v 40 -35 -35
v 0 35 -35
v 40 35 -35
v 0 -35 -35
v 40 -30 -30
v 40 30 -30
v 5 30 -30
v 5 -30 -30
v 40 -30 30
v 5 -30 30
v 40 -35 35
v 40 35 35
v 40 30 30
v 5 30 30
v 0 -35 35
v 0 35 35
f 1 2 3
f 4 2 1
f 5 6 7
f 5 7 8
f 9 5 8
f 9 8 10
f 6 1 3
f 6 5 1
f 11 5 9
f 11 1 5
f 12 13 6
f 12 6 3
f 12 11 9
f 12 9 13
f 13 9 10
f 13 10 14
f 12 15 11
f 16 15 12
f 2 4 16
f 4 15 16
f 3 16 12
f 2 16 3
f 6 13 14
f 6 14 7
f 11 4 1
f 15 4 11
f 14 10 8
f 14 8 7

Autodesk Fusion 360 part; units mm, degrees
sketch "Sketch1" plane through (0, 0, 0) normal (1, 0, 0) x (0, 1, 0)
  line L0 (-35, 35) -> (35, 35)
  line L1 (35, 35) -> (35, -35)
  line L2 (35, -35) -> (-35, -35)
  line L3 (-35, -35) -> (-35, 35)
  line L4 (-35, 35) -> (35, -35) construction
  line L5 (35, 35) -> (-35, -35) construction
  dimension "d1" = 70
  dimension "d2" = 70
extrude "Extrude1" add sketch "Sketch1" along normal blind 40
sketch "Sketch2" plane through (40, 0, 0) normal (1, 0, 0) x (0, 1, 0)
  line L0 (-35, -35) -> (35, -35)
  line L1 (35, -35) -> (35, 35)
  line L2 (35, 35) -> (-35, 35)
  line L3 (-35, 35) -> (-35, -35)
  line L4 (-30, 30) -> (30, 30)
  line L5 (30, 30) -> (30, -30)
  line L6 (30, -30) -> (-30, -30)
  line L7 (-30, -30) -> (-30, 30)
  line L8 (-30, 30) -> (30, -30) construction
  line L9 (30, 30) -> (-30, -30) construction
  dimension "d5" = 5
  dimension "d6" = 5
extrude "Extrude2" cut sketch "Sketch2" against normal blind 35 contours L4 L5 L6 L7
